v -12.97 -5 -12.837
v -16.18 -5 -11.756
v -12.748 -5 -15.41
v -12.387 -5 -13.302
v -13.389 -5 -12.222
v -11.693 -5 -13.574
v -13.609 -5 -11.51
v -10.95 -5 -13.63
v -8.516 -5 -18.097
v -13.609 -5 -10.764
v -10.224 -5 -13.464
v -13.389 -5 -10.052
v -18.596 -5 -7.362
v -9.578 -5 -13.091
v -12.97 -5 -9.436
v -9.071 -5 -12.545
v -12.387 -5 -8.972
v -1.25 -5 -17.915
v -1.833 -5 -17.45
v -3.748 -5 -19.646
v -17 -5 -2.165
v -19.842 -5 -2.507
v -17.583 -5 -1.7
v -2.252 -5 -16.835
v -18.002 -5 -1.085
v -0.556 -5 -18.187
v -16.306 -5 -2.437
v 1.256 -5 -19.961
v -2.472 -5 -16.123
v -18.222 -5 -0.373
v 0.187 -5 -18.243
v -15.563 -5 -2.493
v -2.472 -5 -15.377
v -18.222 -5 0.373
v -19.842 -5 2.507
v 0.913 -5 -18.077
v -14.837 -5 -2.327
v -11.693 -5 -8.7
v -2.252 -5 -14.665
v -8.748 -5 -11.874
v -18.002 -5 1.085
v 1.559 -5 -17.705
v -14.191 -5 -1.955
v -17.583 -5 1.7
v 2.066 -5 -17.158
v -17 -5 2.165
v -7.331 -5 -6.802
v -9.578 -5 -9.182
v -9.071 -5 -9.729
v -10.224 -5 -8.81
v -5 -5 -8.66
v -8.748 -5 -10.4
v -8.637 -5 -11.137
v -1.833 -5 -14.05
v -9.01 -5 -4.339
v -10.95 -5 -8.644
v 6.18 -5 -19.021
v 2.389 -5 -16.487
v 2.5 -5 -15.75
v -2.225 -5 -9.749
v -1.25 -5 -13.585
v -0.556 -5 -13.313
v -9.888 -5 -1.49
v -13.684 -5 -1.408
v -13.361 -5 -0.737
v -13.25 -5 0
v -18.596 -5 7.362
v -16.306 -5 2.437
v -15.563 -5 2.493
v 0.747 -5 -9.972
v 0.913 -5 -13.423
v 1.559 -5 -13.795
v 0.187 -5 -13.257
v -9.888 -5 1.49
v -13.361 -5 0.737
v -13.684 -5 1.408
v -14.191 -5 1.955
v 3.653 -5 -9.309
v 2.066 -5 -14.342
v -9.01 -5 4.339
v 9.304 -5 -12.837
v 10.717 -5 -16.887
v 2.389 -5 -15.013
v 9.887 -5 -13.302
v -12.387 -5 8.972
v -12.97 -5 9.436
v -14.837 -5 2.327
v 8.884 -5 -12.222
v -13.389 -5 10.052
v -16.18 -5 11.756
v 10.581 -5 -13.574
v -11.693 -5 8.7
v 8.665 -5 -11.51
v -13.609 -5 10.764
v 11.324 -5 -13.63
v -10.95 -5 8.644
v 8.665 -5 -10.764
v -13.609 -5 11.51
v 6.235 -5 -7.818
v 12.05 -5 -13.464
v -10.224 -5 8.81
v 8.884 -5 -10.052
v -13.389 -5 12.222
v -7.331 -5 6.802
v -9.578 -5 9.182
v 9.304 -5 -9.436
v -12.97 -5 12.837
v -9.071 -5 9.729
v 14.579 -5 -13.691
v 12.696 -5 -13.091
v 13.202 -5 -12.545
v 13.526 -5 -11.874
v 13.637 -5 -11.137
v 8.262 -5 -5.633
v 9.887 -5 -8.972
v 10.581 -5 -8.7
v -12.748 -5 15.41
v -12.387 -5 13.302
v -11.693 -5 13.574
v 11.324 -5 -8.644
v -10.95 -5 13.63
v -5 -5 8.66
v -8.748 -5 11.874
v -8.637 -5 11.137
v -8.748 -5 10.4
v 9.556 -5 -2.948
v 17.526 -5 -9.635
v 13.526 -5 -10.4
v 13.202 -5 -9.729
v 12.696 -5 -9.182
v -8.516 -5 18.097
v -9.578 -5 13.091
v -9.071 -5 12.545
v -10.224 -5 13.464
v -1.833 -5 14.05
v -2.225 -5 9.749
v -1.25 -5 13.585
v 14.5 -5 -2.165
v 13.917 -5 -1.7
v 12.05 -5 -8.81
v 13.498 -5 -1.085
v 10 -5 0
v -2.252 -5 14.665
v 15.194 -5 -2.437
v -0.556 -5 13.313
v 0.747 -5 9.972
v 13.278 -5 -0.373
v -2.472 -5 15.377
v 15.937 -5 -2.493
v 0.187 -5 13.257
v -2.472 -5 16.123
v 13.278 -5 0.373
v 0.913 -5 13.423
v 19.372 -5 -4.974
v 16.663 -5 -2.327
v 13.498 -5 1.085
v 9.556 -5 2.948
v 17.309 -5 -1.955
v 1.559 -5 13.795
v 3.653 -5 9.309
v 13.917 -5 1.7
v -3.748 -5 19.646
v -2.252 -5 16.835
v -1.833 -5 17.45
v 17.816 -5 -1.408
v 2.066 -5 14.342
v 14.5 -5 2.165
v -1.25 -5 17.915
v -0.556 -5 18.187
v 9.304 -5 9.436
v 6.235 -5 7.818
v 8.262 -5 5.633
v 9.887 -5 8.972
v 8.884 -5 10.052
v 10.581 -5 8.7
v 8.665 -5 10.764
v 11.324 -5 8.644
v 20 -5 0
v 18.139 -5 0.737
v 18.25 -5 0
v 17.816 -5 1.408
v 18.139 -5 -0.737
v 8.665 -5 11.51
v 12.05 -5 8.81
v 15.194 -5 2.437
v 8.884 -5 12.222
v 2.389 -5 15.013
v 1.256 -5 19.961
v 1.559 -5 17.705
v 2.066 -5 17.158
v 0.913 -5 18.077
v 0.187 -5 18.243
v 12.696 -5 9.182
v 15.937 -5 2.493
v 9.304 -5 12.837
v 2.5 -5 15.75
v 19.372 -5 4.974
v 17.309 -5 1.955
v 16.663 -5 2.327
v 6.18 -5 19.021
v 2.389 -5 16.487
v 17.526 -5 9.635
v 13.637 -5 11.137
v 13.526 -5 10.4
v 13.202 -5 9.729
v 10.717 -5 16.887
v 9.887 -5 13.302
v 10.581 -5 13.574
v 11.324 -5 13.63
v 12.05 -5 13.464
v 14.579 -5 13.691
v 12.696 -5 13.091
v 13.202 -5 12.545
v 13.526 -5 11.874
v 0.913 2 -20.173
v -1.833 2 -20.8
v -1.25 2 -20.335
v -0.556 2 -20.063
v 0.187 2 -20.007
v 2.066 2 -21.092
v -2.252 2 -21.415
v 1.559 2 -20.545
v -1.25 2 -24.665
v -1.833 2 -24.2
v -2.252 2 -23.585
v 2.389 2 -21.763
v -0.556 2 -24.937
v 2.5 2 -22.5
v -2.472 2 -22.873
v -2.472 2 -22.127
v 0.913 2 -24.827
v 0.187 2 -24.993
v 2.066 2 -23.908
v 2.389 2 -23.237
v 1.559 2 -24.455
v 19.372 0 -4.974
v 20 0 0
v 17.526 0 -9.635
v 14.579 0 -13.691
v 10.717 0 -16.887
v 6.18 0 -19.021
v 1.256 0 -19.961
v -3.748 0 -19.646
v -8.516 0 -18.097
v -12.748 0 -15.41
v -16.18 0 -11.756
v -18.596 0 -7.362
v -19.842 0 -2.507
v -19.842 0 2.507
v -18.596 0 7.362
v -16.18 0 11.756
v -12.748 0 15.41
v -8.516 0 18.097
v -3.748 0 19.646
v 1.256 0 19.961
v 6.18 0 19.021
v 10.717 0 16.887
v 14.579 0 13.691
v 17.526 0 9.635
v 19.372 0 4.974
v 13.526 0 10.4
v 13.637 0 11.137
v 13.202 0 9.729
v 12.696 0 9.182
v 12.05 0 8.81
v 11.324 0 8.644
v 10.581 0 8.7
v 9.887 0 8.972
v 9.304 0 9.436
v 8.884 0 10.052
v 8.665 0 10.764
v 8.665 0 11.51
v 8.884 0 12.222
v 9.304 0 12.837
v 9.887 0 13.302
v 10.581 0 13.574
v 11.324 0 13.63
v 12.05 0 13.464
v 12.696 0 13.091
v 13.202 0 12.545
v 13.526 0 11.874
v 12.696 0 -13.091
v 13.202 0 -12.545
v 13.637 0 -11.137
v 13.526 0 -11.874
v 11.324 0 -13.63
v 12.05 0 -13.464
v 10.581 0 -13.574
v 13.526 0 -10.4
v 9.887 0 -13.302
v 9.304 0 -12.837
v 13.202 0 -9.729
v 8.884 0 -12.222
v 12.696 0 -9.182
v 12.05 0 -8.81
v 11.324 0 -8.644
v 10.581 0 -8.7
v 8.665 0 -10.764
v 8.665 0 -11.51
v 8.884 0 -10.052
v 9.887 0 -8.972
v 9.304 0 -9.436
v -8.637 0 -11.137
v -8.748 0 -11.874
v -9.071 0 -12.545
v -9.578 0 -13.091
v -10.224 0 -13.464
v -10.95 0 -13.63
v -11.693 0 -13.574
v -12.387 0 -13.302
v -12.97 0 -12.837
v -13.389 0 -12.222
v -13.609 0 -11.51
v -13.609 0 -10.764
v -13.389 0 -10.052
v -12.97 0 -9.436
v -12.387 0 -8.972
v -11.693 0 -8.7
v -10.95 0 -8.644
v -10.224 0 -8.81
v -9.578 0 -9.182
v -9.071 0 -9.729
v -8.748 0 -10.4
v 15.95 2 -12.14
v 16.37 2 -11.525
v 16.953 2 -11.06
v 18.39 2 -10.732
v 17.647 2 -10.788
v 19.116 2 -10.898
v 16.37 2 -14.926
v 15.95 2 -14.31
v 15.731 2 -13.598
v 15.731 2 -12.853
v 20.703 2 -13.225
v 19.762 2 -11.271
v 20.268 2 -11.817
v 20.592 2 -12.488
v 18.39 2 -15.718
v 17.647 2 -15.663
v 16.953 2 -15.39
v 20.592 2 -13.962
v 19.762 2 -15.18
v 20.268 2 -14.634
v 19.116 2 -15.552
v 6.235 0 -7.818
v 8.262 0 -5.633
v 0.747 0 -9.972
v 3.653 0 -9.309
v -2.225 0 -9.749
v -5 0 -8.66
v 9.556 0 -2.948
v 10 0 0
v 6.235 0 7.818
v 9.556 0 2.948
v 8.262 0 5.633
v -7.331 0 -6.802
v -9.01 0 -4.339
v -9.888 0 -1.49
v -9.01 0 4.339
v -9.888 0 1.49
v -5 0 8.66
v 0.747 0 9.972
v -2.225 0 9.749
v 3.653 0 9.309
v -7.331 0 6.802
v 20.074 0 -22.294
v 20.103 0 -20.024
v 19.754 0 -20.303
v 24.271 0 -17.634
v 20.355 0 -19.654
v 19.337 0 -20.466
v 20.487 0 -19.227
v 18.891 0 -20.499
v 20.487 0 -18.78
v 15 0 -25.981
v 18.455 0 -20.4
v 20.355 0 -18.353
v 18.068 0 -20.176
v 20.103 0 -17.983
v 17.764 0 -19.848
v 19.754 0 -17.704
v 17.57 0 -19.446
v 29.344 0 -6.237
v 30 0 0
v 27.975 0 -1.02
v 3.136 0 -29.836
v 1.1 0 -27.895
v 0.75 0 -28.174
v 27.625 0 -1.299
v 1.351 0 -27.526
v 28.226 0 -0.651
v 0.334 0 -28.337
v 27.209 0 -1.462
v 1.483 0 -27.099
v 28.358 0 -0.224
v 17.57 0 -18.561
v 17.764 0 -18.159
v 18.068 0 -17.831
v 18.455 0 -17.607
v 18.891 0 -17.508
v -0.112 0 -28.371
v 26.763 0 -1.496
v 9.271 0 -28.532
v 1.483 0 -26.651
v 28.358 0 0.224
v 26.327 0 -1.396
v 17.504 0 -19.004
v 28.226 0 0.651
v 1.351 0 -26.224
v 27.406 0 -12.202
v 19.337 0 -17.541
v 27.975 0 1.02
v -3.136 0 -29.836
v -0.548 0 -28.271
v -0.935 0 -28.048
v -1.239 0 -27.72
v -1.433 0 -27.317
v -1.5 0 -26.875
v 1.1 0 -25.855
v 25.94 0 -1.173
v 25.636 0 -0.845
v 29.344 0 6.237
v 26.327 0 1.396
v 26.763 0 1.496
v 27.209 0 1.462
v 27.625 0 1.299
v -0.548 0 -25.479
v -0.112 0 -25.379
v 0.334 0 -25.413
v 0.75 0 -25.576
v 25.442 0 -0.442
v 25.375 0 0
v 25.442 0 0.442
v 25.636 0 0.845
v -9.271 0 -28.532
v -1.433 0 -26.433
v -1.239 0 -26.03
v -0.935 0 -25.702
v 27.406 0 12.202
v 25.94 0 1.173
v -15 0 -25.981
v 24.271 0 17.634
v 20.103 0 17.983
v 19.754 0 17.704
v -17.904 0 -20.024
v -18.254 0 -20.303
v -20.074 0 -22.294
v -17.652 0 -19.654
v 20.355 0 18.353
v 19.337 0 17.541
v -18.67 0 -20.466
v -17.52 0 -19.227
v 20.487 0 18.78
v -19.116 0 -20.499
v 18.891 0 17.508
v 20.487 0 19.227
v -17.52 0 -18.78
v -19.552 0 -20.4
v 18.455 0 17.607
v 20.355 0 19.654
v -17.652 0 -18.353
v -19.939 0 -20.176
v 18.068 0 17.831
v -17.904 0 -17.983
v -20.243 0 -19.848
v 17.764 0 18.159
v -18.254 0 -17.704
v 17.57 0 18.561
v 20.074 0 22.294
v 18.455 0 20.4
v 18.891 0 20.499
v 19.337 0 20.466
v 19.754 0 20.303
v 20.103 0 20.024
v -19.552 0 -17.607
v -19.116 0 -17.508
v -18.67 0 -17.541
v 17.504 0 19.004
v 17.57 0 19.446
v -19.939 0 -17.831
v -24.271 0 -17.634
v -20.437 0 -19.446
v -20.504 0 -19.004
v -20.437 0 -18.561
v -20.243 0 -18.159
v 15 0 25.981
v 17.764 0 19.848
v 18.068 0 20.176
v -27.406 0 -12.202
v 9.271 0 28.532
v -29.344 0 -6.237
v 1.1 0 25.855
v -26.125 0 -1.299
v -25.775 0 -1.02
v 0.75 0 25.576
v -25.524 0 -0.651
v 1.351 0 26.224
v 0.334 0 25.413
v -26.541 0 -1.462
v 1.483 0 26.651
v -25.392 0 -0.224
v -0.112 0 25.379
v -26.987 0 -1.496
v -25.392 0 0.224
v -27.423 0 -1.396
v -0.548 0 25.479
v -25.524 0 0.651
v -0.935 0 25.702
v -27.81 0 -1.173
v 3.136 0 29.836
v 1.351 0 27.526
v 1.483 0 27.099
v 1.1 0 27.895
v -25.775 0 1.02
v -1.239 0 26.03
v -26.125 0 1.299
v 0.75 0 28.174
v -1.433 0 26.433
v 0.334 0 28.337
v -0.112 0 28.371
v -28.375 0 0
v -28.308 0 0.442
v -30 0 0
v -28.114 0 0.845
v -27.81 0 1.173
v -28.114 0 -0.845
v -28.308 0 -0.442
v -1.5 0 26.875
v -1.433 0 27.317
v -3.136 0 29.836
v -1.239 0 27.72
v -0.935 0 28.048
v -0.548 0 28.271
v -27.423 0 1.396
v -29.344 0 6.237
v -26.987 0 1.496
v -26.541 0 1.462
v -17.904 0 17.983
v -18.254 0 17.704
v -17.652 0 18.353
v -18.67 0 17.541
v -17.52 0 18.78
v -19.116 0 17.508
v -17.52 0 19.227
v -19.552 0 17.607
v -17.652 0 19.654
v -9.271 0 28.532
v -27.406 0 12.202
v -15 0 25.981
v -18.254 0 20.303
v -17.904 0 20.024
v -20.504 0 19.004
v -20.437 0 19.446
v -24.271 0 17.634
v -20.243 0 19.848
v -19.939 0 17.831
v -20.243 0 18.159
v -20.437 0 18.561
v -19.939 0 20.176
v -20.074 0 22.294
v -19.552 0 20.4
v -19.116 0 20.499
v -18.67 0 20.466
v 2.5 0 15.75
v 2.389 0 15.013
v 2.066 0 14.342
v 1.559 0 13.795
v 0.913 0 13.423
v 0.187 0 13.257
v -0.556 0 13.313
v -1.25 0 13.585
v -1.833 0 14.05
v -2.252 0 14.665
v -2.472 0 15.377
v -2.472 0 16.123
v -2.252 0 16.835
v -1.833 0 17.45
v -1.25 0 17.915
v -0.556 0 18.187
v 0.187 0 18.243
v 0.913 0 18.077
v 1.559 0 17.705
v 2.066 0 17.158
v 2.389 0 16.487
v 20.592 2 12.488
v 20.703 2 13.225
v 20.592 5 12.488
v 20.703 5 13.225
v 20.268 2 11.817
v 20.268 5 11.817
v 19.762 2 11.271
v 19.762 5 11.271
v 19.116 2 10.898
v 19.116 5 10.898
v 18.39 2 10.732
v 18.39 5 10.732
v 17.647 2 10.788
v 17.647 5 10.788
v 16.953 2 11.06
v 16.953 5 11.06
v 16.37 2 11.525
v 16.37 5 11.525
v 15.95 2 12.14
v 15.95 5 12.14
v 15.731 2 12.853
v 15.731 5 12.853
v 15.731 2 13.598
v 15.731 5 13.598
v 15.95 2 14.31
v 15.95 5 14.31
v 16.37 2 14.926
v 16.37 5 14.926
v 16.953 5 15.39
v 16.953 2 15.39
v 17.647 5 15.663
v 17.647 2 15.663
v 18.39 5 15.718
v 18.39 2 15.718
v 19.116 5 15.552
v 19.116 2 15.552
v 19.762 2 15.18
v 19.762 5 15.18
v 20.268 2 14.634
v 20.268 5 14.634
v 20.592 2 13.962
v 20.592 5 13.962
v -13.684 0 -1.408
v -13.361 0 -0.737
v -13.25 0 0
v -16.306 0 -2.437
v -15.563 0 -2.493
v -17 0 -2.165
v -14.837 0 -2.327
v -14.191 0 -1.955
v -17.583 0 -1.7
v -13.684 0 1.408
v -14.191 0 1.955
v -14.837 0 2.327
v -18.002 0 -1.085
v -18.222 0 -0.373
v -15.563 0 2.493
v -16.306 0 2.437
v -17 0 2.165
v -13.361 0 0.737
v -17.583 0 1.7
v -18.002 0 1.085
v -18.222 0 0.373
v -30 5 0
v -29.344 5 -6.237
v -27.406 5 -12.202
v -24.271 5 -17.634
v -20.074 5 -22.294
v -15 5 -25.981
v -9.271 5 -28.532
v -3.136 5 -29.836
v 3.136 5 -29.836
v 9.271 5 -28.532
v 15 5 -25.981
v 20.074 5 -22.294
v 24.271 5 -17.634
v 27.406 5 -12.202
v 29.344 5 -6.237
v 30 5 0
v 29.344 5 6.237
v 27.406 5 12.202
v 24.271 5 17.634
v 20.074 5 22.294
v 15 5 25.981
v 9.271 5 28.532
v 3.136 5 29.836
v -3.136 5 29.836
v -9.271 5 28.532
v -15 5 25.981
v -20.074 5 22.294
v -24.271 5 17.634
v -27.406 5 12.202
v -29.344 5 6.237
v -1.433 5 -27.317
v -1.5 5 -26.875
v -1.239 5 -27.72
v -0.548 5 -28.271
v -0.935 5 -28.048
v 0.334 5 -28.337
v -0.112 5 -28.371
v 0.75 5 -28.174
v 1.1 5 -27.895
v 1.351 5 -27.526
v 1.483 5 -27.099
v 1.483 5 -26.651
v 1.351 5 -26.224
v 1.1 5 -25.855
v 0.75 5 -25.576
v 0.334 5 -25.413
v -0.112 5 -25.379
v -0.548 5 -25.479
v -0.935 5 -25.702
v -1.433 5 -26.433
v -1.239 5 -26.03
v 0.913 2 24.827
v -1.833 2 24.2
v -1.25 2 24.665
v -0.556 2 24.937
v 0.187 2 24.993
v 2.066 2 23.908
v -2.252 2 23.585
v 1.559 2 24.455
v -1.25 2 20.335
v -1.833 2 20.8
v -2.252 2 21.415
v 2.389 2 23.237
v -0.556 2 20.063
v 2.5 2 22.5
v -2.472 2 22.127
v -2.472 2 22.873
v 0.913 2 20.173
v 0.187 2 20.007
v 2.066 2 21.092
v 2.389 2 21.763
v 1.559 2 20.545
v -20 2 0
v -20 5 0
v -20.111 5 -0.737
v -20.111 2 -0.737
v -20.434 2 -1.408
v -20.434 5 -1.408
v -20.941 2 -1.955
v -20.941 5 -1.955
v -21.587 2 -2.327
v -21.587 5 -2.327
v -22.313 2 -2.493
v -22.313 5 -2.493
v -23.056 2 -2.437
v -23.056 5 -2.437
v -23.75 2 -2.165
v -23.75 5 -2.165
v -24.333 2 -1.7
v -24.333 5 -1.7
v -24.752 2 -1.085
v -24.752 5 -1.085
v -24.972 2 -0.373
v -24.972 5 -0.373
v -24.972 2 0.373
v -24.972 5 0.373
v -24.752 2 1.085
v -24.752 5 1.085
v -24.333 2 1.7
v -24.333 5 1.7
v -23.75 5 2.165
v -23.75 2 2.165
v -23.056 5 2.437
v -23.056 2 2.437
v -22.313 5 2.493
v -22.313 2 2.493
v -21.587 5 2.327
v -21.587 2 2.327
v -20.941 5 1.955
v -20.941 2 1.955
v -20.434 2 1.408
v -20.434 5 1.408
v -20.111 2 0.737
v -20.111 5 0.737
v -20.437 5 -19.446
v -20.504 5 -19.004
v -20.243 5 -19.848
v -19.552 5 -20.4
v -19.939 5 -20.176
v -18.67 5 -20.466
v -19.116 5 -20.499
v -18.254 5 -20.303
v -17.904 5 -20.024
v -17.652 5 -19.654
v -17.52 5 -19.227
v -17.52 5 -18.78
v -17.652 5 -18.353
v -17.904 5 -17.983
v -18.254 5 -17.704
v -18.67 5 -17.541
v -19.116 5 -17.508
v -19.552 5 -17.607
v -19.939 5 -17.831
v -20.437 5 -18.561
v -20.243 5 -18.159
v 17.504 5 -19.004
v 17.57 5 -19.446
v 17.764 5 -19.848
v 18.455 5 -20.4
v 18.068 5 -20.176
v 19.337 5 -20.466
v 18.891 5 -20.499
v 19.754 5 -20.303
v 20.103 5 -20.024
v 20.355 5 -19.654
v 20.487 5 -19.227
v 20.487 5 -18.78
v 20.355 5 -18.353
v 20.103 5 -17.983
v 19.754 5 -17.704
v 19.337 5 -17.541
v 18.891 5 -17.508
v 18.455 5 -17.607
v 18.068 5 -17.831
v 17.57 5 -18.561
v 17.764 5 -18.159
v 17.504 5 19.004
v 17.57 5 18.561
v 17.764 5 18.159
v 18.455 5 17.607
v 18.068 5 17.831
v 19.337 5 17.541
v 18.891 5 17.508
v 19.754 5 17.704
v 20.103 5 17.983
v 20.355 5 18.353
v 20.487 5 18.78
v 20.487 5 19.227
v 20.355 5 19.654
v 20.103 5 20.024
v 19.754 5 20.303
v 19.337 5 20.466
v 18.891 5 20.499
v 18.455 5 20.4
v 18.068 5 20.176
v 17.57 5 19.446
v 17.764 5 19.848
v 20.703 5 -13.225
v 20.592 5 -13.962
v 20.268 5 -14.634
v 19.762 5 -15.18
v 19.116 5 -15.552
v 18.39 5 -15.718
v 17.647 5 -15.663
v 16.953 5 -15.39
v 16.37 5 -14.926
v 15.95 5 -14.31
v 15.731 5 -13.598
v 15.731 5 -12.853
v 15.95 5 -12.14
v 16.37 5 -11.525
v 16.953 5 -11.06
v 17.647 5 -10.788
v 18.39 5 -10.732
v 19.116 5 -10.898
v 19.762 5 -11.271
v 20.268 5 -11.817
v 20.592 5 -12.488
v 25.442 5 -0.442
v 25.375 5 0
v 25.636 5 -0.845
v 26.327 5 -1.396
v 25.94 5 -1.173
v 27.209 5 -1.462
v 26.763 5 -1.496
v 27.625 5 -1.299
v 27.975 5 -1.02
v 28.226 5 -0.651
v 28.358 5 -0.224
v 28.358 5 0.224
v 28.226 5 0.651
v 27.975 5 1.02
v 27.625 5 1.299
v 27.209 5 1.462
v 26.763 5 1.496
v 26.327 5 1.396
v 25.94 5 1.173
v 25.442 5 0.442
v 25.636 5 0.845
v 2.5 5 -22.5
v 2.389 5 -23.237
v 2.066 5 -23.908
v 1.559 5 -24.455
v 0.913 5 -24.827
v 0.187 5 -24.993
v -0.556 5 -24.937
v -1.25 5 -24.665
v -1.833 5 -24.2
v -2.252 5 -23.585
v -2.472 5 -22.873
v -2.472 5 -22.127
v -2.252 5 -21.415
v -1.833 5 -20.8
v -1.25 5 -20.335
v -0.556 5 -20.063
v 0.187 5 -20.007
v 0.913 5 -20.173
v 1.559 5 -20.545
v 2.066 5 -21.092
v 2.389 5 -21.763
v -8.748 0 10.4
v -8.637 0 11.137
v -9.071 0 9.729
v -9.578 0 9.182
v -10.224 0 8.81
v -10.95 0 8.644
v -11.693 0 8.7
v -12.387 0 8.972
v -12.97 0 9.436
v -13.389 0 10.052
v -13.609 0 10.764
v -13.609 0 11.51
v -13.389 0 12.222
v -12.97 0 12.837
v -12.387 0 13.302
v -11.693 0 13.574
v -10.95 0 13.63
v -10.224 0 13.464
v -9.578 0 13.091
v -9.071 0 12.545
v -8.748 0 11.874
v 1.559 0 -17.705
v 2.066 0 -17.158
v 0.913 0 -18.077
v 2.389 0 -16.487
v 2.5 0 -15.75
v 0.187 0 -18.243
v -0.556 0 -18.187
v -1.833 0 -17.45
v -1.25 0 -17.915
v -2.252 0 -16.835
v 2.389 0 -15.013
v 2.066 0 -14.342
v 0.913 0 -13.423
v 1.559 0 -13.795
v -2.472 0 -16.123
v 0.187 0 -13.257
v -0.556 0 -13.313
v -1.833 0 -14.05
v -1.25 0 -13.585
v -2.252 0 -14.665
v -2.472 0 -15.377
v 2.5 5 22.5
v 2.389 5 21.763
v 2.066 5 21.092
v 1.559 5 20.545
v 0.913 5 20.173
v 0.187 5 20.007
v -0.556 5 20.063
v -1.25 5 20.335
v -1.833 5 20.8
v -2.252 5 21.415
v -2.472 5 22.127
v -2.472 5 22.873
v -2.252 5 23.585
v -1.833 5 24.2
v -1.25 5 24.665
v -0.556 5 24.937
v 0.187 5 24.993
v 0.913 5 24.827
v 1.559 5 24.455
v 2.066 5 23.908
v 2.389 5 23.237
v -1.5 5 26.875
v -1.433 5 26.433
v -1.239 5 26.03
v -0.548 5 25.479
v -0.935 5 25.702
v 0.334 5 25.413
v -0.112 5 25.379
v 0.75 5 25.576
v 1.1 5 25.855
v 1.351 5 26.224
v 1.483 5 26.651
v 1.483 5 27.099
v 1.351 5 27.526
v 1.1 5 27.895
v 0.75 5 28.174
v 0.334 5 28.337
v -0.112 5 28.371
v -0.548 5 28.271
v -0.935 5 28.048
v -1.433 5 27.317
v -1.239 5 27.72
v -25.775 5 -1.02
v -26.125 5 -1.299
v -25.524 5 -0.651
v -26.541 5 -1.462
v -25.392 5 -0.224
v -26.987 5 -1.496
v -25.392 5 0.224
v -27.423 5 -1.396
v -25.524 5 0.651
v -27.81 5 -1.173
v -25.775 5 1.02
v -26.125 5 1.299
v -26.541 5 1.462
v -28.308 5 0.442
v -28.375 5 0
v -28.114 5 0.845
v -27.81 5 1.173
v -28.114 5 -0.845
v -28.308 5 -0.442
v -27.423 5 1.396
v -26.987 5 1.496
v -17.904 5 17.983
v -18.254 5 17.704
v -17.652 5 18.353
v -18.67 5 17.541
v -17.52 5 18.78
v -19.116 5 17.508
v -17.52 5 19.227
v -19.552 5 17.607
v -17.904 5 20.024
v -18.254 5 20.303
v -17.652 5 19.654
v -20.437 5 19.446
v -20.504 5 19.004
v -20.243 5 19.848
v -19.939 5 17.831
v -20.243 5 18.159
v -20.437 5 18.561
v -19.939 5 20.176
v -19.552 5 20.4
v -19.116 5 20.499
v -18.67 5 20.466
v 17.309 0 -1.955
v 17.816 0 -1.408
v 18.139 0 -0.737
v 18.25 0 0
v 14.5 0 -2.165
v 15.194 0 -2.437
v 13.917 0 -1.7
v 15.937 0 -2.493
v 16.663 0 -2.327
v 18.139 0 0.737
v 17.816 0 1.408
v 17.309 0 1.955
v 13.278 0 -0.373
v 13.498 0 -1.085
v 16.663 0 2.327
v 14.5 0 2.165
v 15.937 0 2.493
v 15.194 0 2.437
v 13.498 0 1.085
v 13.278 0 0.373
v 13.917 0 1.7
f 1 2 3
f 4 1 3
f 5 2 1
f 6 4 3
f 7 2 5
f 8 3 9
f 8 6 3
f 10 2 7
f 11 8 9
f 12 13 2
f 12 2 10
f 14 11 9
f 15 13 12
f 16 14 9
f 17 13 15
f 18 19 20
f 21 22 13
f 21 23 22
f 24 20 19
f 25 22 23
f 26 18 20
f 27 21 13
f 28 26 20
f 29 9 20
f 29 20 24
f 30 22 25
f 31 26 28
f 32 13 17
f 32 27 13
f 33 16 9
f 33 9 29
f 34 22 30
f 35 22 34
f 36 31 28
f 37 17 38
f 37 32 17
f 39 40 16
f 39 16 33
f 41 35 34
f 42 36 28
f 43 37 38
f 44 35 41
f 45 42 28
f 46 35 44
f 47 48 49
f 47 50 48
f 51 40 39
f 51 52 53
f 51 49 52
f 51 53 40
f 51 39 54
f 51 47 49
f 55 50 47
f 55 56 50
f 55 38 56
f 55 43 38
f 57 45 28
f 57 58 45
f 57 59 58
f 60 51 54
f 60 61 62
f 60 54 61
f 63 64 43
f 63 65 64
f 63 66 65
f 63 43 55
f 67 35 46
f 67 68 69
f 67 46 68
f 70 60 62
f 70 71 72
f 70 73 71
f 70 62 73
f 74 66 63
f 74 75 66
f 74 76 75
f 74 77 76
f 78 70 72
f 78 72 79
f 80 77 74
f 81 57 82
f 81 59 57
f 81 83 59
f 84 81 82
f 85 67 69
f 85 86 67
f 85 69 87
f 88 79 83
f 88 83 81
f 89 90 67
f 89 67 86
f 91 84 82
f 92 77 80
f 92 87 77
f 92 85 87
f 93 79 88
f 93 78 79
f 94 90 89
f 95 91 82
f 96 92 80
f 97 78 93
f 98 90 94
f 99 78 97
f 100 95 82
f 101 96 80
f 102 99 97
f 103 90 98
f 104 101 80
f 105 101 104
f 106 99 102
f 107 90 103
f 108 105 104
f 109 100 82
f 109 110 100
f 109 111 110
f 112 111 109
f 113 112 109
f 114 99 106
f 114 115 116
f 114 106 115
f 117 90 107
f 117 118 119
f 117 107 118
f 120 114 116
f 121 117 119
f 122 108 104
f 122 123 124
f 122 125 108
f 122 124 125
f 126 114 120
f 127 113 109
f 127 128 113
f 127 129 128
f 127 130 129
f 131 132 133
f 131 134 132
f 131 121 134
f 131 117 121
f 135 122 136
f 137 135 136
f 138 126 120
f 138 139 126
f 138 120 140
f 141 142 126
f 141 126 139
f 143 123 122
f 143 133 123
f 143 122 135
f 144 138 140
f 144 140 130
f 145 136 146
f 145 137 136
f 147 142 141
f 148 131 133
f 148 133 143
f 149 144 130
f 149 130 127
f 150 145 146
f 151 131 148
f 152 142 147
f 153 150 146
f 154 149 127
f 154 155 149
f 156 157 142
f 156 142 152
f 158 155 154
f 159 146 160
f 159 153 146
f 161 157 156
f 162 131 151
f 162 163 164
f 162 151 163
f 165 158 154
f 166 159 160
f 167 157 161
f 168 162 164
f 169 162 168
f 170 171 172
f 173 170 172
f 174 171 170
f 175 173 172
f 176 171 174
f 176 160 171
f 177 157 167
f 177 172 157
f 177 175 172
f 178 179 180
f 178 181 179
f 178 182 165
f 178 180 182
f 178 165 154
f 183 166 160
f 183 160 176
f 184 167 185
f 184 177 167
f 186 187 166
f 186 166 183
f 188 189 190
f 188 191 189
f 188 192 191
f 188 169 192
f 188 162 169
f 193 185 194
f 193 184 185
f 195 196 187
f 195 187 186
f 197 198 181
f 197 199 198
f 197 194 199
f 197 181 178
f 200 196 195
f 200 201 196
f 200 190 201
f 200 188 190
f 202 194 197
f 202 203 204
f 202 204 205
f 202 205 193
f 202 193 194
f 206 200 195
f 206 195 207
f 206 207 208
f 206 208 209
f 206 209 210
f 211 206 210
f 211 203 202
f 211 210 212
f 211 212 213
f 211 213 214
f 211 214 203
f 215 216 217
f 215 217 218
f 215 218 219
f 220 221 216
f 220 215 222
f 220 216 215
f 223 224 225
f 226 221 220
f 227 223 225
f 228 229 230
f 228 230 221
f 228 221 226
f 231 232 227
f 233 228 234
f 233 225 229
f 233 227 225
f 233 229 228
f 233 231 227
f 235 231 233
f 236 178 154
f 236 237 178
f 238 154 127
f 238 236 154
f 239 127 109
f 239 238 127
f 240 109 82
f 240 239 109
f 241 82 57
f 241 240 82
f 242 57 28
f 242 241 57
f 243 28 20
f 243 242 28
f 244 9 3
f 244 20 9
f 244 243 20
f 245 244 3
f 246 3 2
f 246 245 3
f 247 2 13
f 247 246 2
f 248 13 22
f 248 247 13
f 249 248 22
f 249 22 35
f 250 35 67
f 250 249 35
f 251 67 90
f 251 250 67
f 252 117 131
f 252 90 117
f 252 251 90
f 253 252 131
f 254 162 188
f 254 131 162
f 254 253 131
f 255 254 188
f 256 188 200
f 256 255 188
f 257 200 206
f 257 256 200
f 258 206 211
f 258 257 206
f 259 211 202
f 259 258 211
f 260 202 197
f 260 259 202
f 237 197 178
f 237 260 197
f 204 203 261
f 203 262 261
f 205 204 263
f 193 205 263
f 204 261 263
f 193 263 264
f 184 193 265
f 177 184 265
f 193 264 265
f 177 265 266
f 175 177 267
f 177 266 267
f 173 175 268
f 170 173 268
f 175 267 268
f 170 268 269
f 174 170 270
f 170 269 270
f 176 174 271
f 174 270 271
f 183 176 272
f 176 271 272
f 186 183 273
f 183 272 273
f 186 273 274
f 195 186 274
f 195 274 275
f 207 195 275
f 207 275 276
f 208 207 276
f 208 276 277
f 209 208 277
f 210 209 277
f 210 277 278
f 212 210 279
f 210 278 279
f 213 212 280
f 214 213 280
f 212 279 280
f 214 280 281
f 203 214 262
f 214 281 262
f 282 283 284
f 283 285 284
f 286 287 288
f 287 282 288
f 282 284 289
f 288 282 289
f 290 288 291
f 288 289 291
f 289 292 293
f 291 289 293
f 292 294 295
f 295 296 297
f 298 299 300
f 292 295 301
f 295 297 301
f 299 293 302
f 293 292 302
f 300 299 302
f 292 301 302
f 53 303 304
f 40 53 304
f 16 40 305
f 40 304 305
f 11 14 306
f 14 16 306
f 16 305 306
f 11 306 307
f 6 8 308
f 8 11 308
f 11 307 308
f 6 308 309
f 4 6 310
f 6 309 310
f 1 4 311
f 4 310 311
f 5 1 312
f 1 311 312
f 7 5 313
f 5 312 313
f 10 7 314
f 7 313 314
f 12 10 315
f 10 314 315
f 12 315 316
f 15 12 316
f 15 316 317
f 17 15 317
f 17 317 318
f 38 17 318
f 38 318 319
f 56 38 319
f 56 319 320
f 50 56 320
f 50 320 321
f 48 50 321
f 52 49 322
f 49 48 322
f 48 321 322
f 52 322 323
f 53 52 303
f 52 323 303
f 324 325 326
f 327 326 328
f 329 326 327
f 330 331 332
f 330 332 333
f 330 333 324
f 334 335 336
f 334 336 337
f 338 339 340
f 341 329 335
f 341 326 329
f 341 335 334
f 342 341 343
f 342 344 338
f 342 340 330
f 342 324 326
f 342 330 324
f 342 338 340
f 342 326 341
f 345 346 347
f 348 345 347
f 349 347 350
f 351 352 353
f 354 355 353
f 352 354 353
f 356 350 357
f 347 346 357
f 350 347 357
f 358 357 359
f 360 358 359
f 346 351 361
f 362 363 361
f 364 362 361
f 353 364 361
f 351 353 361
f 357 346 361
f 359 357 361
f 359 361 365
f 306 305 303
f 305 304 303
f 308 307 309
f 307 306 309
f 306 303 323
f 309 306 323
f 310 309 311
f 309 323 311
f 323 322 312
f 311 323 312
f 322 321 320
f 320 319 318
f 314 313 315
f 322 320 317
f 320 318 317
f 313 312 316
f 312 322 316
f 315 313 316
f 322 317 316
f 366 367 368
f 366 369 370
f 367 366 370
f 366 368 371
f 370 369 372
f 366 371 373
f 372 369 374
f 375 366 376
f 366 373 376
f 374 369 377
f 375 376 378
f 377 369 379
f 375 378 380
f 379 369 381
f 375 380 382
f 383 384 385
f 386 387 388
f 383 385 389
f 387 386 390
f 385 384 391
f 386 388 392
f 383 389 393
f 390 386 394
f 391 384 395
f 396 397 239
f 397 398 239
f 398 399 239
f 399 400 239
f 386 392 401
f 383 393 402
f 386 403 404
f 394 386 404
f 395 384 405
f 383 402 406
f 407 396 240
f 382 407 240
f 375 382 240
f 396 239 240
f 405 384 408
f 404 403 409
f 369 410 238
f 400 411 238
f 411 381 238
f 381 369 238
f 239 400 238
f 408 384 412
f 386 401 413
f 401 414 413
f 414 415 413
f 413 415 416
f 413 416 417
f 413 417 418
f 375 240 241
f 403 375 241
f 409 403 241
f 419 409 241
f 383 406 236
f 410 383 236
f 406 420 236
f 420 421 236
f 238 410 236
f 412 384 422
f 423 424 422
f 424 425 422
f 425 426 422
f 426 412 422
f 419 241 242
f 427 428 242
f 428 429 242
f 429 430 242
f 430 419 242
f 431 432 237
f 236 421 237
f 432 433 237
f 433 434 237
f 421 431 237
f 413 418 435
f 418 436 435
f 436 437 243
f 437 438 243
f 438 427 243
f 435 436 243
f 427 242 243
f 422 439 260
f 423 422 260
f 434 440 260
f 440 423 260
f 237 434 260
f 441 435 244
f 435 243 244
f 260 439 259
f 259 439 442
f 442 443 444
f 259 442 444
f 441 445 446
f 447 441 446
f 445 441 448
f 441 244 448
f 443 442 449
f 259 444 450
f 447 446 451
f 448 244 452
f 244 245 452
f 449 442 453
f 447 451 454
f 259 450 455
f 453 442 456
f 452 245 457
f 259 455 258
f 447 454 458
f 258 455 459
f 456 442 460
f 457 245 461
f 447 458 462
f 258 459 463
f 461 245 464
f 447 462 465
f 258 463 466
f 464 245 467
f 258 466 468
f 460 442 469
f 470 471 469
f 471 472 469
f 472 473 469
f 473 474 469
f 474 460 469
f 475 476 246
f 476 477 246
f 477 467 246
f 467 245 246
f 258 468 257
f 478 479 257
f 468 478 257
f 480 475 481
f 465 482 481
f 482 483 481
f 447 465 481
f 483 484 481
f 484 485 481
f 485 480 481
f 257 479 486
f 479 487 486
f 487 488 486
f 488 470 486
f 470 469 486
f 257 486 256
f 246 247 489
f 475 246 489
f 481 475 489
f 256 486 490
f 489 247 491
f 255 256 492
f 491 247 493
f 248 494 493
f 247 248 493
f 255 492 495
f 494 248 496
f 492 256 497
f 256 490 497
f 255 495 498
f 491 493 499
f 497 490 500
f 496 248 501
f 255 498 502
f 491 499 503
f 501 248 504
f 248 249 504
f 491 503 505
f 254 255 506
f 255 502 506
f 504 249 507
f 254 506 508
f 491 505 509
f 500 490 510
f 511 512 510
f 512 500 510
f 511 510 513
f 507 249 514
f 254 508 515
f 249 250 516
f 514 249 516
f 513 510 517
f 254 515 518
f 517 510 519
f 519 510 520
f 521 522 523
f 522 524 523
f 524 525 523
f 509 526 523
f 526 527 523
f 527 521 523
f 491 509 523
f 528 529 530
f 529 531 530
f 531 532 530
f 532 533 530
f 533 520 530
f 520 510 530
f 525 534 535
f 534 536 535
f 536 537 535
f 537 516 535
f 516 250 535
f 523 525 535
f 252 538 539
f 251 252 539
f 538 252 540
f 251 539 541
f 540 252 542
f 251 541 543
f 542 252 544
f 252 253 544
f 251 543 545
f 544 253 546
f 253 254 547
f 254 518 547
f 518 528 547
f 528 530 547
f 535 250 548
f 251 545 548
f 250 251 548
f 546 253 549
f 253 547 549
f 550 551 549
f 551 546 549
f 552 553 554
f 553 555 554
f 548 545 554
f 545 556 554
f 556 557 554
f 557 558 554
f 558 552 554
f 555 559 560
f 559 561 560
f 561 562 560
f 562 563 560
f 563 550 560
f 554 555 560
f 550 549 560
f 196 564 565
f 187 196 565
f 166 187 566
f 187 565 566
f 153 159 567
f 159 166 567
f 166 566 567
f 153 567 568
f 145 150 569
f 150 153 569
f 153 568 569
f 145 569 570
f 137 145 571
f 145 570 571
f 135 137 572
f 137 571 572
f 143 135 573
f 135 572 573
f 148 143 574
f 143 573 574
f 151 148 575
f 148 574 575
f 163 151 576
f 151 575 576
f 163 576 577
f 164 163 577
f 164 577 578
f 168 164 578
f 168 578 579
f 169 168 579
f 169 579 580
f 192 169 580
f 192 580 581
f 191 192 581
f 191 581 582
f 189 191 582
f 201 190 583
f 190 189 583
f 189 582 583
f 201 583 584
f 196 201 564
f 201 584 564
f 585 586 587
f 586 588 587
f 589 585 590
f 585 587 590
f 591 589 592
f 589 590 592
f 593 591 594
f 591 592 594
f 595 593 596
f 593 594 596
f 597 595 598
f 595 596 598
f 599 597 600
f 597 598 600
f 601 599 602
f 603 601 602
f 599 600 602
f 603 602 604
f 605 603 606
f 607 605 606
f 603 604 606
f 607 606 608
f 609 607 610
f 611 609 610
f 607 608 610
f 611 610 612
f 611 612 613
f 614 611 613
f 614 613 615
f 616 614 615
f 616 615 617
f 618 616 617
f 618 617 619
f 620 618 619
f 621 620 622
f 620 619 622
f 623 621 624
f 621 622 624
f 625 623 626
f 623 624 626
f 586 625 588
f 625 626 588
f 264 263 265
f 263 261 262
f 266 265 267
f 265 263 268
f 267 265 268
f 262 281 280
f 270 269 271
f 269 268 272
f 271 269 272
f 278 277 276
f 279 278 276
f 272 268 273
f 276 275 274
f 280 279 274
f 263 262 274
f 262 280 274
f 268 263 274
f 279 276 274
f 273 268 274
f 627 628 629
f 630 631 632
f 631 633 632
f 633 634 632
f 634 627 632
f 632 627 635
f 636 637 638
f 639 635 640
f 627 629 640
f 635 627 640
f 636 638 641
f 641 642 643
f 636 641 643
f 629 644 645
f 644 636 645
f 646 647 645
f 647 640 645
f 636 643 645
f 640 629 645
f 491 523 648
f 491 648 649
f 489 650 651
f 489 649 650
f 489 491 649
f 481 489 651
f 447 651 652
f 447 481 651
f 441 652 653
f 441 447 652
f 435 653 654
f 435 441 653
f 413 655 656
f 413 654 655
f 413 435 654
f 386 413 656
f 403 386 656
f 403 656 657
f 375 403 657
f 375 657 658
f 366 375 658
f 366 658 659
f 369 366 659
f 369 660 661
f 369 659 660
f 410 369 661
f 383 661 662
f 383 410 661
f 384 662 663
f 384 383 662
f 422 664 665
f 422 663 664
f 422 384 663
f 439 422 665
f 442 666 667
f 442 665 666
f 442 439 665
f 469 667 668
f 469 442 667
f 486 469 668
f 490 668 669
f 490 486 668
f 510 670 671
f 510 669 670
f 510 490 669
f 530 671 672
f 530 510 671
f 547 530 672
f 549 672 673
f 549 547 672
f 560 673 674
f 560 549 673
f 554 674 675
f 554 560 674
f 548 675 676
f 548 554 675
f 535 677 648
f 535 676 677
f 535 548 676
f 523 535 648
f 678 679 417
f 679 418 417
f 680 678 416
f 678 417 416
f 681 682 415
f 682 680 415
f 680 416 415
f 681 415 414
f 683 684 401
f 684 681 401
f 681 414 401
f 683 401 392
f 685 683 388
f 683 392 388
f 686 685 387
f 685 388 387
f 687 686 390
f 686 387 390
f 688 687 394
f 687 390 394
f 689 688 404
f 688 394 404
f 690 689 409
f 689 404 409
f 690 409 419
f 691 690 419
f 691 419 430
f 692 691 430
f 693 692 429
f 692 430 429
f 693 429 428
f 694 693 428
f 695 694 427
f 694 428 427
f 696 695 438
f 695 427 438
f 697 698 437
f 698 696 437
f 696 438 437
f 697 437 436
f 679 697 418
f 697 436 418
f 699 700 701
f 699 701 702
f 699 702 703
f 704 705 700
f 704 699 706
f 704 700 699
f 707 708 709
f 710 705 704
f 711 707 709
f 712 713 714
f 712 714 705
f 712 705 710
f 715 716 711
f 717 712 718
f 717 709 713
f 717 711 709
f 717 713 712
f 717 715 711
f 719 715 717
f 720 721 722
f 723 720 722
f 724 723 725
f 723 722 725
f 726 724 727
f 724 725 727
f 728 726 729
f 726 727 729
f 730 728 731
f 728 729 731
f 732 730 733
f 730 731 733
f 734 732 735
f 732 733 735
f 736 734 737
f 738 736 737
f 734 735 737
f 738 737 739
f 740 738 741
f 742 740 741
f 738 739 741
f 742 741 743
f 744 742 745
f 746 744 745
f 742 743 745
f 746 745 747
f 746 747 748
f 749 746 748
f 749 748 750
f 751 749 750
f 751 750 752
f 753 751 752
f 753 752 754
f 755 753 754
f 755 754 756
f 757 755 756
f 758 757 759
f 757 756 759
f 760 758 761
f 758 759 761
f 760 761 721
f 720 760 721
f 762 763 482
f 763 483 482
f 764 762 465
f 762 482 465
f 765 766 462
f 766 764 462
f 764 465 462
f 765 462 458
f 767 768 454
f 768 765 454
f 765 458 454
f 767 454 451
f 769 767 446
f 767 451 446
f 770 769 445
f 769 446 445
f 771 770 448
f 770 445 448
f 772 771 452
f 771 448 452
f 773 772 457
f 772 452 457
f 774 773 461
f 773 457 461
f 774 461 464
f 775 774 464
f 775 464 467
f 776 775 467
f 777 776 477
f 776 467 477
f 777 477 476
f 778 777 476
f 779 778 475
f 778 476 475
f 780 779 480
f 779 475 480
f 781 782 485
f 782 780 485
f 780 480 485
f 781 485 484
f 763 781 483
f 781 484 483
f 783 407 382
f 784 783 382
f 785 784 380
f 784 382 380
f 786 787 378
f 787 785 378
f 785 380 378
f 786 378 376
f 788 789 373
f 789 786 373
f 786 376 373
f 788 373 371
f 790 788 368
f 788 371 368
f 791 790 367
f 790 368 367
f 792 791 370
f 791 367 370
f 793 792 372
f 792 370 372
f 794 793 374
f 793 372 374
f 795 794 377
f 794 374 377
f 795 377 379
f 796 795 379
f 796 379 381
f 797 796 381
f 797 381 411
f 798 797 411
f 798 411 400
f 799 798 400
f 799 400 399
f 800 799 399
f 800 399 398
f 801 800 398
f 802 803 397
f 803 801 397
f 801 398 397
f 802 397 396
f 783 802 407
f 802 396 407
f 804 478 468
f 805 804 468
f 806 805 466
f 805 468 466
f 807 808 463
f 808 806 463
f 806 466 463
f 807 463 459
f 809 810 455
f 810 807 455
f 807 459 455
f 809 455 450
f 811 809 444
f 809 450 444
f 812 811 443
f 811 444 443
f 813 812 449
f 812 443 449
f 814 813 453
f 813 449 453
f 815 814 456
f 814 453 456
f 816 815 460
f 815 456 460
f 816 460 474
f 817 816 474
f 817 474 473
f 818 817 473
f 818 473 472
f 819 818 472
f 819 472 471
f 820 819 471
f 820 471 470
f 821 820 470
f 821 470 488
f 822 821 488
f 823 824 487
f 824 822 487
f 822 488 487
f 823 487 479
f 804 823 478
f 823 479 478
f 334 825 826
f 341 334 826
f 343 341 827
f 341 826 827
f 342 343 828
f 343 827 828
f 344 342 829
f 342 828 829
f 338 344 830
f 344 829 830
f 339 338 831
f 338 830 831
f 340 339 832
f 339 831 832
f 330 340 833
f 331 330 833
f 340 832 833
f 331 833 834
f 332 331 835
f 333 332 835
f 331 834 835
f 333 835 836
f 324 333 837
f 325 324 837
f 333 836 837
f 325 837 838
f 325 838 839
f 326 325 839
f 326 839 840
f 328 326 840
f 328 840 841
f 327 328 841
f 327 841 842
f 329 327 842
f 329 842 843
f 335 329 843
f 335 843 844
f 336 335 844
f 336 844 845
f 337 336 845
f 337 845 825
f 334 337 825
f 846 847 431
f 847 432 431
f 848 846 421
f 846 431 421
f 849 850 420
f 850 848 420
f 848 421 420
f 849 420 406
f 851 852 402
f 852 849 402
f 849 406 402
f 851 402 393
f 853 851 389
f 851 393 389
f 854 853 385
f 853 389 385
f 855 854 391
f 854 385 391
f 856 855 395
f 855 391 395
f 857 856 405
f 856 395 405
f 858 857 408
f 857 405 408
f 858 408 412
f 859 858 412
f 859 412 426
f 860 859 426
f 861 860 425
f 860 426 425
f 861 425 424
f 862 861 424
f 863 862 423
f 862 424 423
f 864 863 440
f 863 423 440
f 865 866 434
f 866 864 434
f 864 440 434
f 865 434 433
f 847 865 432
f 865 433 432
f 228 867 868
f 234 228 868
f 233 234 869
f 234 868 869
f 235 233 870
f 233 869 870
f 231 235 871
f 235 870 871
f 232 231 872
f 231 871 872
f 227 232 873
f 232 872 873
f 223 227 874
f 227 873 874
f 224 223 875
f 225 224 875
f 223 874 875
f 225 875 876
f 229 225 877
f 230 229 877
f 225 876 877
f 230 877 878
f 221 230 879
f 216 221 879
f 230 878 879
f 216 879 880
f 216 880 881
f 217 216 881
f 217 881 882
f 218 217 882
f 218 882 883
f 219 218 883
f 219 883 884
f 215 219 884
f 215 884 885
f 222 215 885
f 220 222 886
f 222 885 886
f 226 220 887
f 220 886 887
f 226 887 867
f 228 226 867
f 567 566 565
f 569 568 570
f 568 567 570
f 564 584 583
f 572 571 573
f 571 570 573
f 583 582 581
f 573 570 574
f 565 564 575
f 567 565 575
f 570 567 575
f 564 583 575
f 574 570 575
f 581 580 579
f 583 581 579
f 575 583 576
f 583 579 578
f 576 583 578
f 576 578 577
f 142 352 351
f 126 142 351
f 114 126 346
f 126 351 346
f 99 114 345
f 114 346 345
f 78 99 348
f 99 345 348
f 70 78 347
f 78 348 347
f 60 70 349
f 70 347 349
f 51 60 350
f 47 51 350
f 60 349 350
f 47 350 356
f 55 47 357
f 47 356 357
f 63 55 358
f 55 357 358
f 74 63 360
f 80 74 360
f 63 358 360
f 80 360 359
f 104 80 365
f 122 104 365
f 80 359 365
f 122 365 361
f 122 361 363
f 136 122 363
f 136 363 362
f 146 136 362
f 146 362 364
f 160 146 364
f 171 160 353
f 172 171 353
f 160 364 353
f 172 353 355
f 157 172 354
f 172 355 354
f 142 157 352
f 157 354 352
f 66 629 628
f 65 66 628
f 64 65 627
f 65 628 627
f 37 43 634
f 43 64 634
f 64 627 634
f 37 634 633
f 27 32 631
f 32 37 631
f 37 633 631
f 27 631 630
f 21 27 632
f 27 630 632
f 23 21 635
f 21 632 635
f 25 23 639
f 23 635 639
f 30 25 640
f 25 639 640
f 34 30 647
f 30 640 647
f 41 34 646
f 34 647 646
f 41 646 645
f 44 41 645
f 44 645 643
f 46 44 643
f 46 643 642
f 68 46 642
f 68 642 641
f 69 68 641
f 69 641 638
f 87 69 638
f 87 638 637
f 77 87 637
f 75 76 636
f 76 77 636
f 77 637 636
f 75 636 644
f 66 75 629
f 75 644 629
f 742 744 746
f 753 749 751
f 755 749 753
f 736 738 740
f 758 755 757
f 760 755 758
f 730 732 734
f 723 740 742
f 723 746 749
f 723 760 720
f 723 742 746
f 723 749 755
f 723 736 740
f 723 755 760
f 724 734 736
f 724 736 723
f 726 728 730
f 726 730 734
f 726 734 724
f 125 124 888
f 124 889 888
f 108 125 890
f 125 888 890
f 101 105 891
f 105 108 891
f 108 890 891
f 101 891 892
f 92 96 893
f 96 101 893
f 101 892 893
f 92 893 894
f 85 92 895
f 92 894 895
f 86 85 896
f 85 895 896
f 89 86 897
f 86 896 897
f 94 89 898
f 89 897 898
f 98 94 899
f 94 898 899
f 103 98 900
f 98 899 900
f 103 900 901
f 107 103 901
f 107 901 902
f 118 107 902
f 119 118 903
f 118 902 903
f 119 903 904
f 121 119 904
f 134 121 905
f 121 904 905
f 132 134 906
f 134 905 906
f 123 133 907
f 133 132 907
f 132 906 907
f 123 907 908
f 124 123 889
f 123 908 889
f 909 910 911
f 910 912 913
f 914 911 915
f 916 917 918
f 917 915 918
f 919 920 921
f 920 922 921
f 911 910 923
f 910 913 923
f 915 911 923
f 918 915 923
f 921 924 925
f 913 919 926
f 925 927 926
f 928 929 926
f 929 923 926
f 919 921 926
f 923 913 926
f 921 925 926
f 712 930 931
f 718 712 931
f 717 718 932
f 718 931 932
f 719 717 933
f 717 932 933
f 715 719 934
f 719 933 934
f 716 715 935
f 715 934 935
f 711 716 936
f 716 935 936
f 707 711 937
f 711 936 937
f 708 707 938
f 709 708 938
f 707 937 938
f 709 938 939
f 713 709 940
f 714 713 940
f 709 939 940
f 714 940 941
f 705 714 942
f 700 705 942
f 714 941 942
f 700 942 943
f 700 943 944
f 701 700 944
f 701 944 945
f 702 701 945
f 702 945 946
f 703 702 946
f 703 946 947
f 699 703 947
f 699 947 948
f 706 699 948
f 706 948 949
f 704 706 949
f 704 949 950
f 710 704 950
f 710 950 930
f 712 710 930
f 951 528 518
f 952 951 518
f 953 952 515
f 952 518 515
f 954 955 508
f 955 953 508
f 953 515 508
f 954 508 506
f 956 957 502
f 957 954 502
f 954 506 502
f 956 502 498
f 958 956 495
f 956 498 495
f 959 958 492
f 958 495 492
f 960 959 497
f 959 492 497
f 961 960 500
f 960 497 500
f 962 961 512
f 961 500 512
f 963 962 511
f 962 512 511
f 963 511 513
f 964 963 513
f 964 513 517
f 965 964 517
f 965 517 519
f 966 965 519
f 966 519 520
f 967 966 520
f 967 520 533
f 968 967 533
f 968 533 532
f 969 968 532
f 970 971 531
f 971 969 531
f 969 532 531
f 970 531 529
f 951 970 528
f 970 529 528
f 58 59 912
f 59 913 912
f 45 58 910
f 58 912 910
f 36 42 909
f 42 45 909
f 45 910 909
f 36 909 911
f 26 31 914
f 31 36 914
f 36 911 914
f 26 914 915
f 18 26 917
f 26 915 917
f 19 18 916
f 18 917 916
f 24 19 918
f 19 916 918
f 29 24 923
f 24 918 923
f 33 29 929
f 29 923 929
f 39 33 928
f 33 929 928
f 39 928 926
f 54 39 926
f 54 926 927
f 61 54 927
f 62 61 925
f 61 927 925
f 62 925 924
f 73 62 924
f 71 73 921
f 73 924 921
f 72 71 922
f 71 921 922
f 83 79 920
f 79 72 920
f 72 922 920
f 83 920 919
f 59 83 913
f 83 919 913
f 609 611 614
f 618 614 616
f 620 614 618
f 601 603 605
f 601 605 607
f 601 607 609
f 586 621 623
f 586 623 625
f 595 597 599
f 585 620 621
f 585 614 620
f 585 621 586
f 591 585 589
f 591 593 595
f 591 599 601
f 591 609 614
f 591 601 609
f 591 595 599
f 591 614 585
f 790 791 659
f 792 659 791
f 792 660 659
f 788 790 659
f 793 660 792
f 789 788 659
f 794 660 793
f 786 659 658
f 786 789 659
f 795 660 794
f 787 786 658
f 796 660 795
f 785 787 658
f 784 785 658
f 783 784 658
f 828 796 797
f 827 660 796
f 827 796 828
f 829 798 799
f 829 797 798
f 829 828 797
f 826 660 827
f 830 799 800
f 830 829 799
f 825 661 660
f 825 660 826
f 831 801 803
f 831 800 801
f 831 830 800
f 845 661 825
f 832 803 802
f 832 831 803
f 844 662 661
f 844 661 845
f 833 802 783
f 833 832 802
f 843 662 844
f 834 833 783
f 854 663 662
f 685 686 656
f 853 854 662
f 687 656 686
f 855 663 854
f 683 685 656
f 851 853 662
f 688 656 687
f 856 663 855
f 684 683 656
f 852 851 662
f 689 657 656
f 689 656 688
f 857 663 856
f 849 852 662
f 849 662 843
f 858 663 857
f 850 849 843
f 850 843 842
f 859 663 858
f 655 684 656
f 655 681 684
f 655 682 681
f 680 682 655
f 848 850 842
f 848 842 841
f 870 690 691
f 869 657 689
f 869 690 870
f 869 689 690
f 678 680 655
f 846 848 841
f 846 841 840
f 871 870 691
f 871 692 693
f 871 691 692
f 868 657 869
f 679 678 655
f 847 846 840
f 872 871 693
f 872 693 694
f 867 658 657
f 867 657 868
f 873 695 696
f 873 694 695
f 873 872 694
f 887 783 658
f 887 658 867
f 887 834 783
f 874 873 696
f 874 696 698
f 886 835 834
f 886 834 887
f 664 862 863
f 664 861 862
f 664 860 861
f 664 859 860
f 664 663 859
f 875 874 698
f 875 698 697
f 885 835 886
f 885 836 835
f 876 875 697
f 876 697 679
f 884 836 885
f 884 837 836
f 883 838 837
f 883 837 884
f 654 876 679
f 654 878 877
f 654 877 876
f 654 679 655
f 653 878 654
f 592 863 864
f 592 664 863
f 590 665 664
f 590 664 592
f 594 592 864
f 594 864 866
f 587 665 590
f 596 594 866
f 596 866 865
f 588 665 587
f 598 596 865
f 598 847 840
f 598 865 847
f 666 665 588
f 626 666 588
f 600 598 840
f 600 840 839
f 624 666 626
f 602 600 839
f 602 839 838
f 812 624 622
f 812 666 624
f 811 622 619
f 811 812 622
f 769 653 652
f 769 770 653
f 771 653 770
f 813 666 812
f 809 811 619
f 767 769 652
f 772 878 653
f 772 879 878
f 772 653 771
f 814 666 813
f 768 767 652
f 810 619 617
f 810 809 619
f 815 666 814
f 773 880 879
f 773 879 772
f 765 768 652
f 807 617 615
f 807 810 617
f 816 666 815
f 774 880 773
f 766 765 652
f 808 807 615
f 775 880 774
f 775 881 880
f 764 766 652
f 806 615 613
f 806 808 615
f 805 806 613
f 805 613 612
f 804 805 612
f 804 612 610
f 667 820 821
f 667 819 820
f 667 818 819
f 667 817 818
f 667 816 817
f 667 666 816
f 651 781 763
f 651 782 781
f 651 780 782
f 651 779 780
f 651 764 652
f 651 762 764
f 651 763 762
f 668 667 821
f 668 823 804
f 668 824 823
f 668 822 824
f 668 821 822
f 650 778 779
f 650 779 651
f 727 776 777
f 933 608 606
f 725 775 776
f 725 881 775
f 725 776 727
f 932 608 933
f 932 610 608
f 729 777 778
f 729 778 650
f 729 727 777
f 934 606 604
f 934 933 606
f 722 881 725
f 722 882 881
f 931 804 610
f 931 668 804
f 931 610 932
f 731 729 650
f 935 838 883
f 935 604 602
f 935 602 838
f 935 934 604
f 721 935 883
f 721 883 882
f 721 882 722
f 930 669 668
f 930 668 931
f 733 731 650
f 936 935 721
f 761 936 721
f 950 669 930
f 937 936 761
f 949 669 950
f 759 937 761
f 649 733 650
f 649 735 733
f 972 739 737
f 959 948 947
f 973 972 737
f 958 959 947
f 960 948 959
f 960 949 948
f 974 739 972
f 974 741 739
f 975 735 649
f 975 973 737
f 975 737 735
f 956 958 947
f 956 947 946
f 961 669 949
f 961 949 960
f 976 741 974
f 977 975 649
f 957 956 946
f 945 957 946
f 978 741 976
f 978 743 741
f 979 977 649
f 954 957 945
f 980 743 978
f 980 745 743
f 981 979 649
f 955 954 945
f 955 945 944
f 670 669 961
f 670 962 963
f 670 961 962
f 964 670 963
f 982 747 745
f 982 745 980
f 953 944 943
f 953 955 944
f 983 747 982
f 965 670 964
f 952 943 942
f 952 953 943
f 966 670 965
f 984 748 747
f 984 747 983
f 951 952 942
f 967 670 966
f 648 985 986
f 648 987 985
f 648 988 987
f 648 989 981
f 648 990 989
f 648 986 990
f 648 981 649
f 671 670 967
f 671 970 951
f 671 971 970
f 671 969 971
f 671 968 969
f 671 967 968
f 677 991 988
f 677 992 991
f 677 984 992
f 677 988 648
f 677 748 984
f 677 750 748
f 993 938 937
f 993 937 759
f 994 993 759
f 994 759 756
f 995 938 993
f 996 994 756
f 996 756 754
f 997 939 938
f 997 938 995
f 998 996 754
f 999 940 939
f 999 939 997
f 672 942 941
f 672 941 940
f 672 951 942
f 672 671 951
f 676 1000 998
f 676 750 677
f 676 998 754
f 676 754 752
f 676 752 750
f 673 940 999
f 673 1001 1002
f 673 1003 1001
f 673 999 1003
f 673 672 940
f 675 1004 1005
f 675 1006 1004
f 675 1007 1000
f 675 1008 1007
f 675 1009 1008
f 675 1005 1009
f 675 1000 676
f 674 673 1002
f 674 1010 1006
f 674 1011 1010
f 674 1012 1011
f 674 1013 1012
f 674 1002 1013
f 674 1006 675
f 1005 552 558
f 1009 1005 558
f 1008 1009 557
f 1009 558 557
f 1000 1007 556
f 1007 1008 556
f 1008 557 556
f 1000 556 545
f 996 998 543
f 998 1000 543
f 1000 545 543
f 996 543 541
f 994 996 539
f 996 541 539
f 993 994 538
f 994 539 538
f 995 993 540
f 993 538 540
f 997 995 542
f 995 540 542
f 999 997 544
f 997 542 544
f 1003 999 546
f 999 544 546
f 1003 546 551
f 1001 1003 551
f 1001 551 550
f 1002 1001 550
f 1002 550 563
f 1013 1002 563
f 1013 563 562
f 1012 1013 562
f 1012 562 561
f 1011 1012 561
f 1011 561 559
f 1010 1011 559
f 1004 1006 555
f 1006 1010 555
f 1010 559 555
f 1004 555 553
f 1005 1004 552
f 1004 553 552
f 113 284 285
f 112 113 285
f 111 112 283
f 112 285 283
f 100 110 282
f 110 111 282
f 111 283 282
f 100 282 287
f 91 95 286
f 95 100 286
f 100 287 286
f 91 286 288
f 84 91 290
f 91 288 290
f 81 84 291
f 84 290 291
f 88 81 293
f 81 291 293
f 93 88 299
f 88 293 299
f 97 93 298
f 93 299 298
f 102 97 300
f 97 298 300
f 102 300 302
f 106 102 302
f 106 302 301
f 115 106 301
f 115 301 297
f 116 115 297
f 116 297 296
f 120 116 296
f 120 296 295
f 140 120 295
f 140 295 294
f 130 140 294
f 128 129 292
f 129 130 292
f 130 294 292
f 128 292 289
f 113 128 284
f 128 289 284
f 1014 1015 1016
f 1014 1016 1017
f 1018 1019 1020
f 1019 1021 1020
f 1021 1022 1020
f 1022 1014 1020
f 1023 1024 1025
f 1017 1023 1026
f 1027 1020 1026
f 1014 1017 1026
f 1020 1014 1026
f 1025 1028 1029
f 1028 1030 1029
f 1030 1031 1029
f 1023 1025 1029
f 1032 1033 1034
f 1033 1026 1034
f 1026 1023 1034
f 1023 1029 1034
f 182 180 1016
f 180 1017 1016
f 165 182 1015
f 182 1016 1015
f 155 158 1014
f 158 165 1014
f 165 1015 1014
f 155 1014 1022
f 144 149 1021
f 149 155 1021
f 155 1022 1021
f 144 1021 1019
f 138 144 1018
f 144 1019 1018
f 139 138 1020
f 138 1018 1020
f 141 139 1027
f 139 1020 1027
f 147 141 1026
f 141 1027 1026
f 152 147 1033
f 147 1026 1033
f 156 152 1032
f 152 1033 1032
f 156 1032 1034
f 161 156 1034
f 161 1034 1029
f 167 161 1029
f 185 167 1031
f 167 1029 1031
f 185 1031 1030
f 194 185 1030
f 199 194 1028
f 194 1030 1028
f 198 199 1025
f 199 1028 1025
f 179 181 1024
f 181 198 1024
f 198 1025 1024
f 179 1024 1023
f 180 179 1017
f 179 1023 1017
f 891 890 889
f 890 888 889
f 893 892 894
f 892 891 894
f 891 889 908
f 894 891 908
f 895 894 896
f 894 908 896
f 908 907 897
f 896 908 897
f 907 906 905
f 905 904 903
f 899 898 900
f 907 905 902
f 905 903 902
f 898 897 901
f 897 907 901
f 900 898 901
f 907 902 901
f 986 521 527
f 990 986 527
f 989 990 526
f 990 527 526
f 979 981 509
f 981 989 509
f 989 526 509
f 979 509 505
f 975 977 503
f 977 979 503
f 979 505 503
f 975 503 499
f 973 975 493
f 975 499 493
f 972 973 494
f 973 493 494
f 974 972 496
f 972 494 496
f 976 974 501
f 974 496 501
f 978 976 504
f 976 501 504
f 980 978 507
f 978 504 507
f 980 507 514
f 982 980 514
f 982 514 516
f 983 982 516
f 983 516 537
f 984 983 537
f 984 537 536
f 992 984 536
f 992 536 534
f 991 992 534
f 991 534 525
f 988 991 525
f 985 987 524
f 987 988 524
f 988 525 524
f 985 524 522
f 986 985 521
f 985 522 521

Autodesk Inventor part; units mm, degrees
ref_plane "YZ Plane" through (0, 0, 0) normal (1, 0, 0) x (0, 1, 0)
ref_plane "XZ Plane" through (0, 0, 0) normal (0, 1, 0) x (-1, 0, 0)
ref_plane "XY Plane" through (0, 0, 0) normal (0, 0, 1) x (1, 0, 0)
sketch "Sketch1" plane through (0, 0, 0) normal (0, 1, 0) x (-1, 0, 0)
  circle A0 centre (26.875, 0) radius 1.5
  circle A1 centre (0, -26.875) radius 1.5
  circle A2 centre (-26.875, 0) radius 1.5
  circle A3 centre (0, 26.875) radius 1.5
  circle A4 centre (19.0035, 19.0035) radius 1.5
  circle A5 centre (19.0035, -19.0035) radius 1.5
  circle A6 centre (-19.0035, -19.0035) radius 1.5
  circle A7 centre (-19.0035, 19.0035) radius 1.5
  circle A8 centre (0, 0) radius 28.75
  circle A9 centre (0, 0) radius 30
  point P0 (-23.5374, 22.0452)
  dimension "d9" = 3
  dimension "d10" = 3
  dimension "d11" = 3
  dimension "d12" = 3
  dimension "d13" = 3
  dimension "d14" = 3
  dimension "d15" = 3
  dimension "d16" = 3
  dimension "d17" = 57.5
  dimension "d33" = 60
extrude "Extrusion1" add sketch "Sketch1" along normal blind 5 contours A8 | A9
sketch "Sketch2" plane through (0, 5, 0) normal (0, 1, 0) x (1, 0, 0)
  circle A0 centre (0, 0) radius 25
  line L0 (22.1416, 4) -> (20.8701, 4)
  line L1 (22.1416, -4) -> (20.8701, -4)
  arc A1 (24.6779, 4) -> (-17.6137, 17.7414) centre (0, 0) ccw
  arc A2 (-17.6137, -17.7414) -> (24.6779, -4) centre (0, 0) ccw
  line L2 (24.6779, -4) -> (22.1416, -4)
  line L3 (24.6779, 4) -> (22.1416, 4)
  line L4 (-15.5618, -16.2506) -> (-14.5332, -15.5032)
  line L5 (-19.2354, -9.0311) -> (-15.1903, -6.0922)
  line L6 (-15.1903, -6.0922) -> (-10.4881, -12.5643)
  line L7 (-10.4881, -12.5643) -> (-14.5332, -15.5032)
  line L8 (-22.316, -11.2693) -> (-20.2641, -9.7784)
  line L9 (-17.6137, -17.7414) -> (-15.5618, -16.2506)
  line L10 (-20.2641, -9.7784) -> (-19.2354, -9.0311)
  circle A3 centre (0, 22.5) radius 1.5
  line L11 (-10.4881, 12.5643) -> (-15.1903, 6.0922)
  line L12 (-14.5332, 15.5032) -> (-10.4881, 12.5643)
  line L13 (-15.5618, 16.2506) -> (-14.5332, 15.5032)
  line L14 (-15.1903, 6.0922) -> (-19.2354, 9.0311)
  line L15 (-20.2641, 9.7784) -> (-19.2354, 9.0311)
  line L16 (-17.6137, 17.7414) -> (-15.5618, 16.2506)
  line L17 (-23.5374, 22.0452) -> (-13.679, 22.0452) construction
  line L18 (-22.316, 11.2693) -> (-20.2641, 9.7784)
  arc A4 (-22.316, 11.2693) -> (-22.316, -11.2693) centre (0, 0) ccw
  line L19 (15.8701, -4) -> (20.8701, -4)
  circle A5 centre (18.2029, -13.2252) radius 1.5
  circle A6 centre (0, -22.5) radius 1.5
  circle A7 centre (18.2029, 13.2252) radius 1.5
  line L20 (20.8701, 4) -> (15.8701, 4)
  line L21 (15.8701, 4) -> (15.8701, -4)
  arc A8 (-13.5023, -14.7543) -> (19.5959, -4) centre (0, 0) ccw
  arc A9 (19.5959, 4) -> (-13.5023, 14.7543) centre (0, 0) ccw
  arc A10 (-18.2046, 8.2821) -> (-18.2046, -8.2821) centre (0, 0) ccw
  circle A11 centre (-22.5, 0) radius 1.5
  circle A12 centre (0, 0) radius 20
  circle A13 centre (-22.5, 0) radius 2.5
  circle A14 centre (0, -22.5) radius 2.5
  circle A15 centre (18.2029, -13.2252) radius 2.5
  circle A16 centre (18.2029, 13.2252) radius 2.5
  circle A17 centre (0, 22.5) radius 2.5
  point P0 (-28.2397, -15.5731)
  point P1 (-23.5374, -22.0452)
  dimension "d20" = 50
  dimension "d21" = 36
  dimension "d22" = 5
  dimension "d23" = 5
  dimension "d24" = 3
  dimension "d25" = 3
  dimension "d26" = 3
  dimension "d27" = 3
  dimension "d28" = 3
  dimension "d29" = 5
  dimension "d30" = 5
extrude "Extrusion2" cut sketch "Sketch2" against normal blind 3 contours A16 | A15 | A17 | A14 | A13 | A3 | A5 | A6 | A7 | A11
sketch "Sketch3" plane through (0, 0, 0) normal (0, -1, 0) x (1, 0, 0)
  circle A0 centre (0, 0) radius 20
  circle A1 centre (0, 0) radius 10
  circle A2 centre (0, 15.75) radius 2.5
  circle A3 centre (15.75, 0) radius 2.5
  line L0 (0, 0) -> (11.1369, 11.1369)
  line L1 (0, 0) -> (15.75, 0) construction
  circle A4 centre (11.1369, 11.1369) radius 2.5
  circle A5 centre (11.1369, -11.1369) radius 2.5
  circle A6 centre (-11.1369, -11.1369) radius 2.5
  circle A7 centre (-11.1369, 11.1369) radius 2.5
  circle A8 centre (-15.75, 0) radius 2.5
  circle A9 centre (0, -15.75) radius 2.5
  dimension "d34" = 40
  dimension "d35" = 20
  dimension "d37" = 5
  dimension "d38" = 5
  dimension "d39" = 45
  dimension "d40" = 5
  dimension "d41" = 5
  dimension "d42" = 5
  dimension "d43" = 5
  dimension "d44" = 5
  dimension "d45" = 5
extrude "Extrusion3" add sketch "Sketch3" along normal blind 5
properties part number "mountingPlate"
